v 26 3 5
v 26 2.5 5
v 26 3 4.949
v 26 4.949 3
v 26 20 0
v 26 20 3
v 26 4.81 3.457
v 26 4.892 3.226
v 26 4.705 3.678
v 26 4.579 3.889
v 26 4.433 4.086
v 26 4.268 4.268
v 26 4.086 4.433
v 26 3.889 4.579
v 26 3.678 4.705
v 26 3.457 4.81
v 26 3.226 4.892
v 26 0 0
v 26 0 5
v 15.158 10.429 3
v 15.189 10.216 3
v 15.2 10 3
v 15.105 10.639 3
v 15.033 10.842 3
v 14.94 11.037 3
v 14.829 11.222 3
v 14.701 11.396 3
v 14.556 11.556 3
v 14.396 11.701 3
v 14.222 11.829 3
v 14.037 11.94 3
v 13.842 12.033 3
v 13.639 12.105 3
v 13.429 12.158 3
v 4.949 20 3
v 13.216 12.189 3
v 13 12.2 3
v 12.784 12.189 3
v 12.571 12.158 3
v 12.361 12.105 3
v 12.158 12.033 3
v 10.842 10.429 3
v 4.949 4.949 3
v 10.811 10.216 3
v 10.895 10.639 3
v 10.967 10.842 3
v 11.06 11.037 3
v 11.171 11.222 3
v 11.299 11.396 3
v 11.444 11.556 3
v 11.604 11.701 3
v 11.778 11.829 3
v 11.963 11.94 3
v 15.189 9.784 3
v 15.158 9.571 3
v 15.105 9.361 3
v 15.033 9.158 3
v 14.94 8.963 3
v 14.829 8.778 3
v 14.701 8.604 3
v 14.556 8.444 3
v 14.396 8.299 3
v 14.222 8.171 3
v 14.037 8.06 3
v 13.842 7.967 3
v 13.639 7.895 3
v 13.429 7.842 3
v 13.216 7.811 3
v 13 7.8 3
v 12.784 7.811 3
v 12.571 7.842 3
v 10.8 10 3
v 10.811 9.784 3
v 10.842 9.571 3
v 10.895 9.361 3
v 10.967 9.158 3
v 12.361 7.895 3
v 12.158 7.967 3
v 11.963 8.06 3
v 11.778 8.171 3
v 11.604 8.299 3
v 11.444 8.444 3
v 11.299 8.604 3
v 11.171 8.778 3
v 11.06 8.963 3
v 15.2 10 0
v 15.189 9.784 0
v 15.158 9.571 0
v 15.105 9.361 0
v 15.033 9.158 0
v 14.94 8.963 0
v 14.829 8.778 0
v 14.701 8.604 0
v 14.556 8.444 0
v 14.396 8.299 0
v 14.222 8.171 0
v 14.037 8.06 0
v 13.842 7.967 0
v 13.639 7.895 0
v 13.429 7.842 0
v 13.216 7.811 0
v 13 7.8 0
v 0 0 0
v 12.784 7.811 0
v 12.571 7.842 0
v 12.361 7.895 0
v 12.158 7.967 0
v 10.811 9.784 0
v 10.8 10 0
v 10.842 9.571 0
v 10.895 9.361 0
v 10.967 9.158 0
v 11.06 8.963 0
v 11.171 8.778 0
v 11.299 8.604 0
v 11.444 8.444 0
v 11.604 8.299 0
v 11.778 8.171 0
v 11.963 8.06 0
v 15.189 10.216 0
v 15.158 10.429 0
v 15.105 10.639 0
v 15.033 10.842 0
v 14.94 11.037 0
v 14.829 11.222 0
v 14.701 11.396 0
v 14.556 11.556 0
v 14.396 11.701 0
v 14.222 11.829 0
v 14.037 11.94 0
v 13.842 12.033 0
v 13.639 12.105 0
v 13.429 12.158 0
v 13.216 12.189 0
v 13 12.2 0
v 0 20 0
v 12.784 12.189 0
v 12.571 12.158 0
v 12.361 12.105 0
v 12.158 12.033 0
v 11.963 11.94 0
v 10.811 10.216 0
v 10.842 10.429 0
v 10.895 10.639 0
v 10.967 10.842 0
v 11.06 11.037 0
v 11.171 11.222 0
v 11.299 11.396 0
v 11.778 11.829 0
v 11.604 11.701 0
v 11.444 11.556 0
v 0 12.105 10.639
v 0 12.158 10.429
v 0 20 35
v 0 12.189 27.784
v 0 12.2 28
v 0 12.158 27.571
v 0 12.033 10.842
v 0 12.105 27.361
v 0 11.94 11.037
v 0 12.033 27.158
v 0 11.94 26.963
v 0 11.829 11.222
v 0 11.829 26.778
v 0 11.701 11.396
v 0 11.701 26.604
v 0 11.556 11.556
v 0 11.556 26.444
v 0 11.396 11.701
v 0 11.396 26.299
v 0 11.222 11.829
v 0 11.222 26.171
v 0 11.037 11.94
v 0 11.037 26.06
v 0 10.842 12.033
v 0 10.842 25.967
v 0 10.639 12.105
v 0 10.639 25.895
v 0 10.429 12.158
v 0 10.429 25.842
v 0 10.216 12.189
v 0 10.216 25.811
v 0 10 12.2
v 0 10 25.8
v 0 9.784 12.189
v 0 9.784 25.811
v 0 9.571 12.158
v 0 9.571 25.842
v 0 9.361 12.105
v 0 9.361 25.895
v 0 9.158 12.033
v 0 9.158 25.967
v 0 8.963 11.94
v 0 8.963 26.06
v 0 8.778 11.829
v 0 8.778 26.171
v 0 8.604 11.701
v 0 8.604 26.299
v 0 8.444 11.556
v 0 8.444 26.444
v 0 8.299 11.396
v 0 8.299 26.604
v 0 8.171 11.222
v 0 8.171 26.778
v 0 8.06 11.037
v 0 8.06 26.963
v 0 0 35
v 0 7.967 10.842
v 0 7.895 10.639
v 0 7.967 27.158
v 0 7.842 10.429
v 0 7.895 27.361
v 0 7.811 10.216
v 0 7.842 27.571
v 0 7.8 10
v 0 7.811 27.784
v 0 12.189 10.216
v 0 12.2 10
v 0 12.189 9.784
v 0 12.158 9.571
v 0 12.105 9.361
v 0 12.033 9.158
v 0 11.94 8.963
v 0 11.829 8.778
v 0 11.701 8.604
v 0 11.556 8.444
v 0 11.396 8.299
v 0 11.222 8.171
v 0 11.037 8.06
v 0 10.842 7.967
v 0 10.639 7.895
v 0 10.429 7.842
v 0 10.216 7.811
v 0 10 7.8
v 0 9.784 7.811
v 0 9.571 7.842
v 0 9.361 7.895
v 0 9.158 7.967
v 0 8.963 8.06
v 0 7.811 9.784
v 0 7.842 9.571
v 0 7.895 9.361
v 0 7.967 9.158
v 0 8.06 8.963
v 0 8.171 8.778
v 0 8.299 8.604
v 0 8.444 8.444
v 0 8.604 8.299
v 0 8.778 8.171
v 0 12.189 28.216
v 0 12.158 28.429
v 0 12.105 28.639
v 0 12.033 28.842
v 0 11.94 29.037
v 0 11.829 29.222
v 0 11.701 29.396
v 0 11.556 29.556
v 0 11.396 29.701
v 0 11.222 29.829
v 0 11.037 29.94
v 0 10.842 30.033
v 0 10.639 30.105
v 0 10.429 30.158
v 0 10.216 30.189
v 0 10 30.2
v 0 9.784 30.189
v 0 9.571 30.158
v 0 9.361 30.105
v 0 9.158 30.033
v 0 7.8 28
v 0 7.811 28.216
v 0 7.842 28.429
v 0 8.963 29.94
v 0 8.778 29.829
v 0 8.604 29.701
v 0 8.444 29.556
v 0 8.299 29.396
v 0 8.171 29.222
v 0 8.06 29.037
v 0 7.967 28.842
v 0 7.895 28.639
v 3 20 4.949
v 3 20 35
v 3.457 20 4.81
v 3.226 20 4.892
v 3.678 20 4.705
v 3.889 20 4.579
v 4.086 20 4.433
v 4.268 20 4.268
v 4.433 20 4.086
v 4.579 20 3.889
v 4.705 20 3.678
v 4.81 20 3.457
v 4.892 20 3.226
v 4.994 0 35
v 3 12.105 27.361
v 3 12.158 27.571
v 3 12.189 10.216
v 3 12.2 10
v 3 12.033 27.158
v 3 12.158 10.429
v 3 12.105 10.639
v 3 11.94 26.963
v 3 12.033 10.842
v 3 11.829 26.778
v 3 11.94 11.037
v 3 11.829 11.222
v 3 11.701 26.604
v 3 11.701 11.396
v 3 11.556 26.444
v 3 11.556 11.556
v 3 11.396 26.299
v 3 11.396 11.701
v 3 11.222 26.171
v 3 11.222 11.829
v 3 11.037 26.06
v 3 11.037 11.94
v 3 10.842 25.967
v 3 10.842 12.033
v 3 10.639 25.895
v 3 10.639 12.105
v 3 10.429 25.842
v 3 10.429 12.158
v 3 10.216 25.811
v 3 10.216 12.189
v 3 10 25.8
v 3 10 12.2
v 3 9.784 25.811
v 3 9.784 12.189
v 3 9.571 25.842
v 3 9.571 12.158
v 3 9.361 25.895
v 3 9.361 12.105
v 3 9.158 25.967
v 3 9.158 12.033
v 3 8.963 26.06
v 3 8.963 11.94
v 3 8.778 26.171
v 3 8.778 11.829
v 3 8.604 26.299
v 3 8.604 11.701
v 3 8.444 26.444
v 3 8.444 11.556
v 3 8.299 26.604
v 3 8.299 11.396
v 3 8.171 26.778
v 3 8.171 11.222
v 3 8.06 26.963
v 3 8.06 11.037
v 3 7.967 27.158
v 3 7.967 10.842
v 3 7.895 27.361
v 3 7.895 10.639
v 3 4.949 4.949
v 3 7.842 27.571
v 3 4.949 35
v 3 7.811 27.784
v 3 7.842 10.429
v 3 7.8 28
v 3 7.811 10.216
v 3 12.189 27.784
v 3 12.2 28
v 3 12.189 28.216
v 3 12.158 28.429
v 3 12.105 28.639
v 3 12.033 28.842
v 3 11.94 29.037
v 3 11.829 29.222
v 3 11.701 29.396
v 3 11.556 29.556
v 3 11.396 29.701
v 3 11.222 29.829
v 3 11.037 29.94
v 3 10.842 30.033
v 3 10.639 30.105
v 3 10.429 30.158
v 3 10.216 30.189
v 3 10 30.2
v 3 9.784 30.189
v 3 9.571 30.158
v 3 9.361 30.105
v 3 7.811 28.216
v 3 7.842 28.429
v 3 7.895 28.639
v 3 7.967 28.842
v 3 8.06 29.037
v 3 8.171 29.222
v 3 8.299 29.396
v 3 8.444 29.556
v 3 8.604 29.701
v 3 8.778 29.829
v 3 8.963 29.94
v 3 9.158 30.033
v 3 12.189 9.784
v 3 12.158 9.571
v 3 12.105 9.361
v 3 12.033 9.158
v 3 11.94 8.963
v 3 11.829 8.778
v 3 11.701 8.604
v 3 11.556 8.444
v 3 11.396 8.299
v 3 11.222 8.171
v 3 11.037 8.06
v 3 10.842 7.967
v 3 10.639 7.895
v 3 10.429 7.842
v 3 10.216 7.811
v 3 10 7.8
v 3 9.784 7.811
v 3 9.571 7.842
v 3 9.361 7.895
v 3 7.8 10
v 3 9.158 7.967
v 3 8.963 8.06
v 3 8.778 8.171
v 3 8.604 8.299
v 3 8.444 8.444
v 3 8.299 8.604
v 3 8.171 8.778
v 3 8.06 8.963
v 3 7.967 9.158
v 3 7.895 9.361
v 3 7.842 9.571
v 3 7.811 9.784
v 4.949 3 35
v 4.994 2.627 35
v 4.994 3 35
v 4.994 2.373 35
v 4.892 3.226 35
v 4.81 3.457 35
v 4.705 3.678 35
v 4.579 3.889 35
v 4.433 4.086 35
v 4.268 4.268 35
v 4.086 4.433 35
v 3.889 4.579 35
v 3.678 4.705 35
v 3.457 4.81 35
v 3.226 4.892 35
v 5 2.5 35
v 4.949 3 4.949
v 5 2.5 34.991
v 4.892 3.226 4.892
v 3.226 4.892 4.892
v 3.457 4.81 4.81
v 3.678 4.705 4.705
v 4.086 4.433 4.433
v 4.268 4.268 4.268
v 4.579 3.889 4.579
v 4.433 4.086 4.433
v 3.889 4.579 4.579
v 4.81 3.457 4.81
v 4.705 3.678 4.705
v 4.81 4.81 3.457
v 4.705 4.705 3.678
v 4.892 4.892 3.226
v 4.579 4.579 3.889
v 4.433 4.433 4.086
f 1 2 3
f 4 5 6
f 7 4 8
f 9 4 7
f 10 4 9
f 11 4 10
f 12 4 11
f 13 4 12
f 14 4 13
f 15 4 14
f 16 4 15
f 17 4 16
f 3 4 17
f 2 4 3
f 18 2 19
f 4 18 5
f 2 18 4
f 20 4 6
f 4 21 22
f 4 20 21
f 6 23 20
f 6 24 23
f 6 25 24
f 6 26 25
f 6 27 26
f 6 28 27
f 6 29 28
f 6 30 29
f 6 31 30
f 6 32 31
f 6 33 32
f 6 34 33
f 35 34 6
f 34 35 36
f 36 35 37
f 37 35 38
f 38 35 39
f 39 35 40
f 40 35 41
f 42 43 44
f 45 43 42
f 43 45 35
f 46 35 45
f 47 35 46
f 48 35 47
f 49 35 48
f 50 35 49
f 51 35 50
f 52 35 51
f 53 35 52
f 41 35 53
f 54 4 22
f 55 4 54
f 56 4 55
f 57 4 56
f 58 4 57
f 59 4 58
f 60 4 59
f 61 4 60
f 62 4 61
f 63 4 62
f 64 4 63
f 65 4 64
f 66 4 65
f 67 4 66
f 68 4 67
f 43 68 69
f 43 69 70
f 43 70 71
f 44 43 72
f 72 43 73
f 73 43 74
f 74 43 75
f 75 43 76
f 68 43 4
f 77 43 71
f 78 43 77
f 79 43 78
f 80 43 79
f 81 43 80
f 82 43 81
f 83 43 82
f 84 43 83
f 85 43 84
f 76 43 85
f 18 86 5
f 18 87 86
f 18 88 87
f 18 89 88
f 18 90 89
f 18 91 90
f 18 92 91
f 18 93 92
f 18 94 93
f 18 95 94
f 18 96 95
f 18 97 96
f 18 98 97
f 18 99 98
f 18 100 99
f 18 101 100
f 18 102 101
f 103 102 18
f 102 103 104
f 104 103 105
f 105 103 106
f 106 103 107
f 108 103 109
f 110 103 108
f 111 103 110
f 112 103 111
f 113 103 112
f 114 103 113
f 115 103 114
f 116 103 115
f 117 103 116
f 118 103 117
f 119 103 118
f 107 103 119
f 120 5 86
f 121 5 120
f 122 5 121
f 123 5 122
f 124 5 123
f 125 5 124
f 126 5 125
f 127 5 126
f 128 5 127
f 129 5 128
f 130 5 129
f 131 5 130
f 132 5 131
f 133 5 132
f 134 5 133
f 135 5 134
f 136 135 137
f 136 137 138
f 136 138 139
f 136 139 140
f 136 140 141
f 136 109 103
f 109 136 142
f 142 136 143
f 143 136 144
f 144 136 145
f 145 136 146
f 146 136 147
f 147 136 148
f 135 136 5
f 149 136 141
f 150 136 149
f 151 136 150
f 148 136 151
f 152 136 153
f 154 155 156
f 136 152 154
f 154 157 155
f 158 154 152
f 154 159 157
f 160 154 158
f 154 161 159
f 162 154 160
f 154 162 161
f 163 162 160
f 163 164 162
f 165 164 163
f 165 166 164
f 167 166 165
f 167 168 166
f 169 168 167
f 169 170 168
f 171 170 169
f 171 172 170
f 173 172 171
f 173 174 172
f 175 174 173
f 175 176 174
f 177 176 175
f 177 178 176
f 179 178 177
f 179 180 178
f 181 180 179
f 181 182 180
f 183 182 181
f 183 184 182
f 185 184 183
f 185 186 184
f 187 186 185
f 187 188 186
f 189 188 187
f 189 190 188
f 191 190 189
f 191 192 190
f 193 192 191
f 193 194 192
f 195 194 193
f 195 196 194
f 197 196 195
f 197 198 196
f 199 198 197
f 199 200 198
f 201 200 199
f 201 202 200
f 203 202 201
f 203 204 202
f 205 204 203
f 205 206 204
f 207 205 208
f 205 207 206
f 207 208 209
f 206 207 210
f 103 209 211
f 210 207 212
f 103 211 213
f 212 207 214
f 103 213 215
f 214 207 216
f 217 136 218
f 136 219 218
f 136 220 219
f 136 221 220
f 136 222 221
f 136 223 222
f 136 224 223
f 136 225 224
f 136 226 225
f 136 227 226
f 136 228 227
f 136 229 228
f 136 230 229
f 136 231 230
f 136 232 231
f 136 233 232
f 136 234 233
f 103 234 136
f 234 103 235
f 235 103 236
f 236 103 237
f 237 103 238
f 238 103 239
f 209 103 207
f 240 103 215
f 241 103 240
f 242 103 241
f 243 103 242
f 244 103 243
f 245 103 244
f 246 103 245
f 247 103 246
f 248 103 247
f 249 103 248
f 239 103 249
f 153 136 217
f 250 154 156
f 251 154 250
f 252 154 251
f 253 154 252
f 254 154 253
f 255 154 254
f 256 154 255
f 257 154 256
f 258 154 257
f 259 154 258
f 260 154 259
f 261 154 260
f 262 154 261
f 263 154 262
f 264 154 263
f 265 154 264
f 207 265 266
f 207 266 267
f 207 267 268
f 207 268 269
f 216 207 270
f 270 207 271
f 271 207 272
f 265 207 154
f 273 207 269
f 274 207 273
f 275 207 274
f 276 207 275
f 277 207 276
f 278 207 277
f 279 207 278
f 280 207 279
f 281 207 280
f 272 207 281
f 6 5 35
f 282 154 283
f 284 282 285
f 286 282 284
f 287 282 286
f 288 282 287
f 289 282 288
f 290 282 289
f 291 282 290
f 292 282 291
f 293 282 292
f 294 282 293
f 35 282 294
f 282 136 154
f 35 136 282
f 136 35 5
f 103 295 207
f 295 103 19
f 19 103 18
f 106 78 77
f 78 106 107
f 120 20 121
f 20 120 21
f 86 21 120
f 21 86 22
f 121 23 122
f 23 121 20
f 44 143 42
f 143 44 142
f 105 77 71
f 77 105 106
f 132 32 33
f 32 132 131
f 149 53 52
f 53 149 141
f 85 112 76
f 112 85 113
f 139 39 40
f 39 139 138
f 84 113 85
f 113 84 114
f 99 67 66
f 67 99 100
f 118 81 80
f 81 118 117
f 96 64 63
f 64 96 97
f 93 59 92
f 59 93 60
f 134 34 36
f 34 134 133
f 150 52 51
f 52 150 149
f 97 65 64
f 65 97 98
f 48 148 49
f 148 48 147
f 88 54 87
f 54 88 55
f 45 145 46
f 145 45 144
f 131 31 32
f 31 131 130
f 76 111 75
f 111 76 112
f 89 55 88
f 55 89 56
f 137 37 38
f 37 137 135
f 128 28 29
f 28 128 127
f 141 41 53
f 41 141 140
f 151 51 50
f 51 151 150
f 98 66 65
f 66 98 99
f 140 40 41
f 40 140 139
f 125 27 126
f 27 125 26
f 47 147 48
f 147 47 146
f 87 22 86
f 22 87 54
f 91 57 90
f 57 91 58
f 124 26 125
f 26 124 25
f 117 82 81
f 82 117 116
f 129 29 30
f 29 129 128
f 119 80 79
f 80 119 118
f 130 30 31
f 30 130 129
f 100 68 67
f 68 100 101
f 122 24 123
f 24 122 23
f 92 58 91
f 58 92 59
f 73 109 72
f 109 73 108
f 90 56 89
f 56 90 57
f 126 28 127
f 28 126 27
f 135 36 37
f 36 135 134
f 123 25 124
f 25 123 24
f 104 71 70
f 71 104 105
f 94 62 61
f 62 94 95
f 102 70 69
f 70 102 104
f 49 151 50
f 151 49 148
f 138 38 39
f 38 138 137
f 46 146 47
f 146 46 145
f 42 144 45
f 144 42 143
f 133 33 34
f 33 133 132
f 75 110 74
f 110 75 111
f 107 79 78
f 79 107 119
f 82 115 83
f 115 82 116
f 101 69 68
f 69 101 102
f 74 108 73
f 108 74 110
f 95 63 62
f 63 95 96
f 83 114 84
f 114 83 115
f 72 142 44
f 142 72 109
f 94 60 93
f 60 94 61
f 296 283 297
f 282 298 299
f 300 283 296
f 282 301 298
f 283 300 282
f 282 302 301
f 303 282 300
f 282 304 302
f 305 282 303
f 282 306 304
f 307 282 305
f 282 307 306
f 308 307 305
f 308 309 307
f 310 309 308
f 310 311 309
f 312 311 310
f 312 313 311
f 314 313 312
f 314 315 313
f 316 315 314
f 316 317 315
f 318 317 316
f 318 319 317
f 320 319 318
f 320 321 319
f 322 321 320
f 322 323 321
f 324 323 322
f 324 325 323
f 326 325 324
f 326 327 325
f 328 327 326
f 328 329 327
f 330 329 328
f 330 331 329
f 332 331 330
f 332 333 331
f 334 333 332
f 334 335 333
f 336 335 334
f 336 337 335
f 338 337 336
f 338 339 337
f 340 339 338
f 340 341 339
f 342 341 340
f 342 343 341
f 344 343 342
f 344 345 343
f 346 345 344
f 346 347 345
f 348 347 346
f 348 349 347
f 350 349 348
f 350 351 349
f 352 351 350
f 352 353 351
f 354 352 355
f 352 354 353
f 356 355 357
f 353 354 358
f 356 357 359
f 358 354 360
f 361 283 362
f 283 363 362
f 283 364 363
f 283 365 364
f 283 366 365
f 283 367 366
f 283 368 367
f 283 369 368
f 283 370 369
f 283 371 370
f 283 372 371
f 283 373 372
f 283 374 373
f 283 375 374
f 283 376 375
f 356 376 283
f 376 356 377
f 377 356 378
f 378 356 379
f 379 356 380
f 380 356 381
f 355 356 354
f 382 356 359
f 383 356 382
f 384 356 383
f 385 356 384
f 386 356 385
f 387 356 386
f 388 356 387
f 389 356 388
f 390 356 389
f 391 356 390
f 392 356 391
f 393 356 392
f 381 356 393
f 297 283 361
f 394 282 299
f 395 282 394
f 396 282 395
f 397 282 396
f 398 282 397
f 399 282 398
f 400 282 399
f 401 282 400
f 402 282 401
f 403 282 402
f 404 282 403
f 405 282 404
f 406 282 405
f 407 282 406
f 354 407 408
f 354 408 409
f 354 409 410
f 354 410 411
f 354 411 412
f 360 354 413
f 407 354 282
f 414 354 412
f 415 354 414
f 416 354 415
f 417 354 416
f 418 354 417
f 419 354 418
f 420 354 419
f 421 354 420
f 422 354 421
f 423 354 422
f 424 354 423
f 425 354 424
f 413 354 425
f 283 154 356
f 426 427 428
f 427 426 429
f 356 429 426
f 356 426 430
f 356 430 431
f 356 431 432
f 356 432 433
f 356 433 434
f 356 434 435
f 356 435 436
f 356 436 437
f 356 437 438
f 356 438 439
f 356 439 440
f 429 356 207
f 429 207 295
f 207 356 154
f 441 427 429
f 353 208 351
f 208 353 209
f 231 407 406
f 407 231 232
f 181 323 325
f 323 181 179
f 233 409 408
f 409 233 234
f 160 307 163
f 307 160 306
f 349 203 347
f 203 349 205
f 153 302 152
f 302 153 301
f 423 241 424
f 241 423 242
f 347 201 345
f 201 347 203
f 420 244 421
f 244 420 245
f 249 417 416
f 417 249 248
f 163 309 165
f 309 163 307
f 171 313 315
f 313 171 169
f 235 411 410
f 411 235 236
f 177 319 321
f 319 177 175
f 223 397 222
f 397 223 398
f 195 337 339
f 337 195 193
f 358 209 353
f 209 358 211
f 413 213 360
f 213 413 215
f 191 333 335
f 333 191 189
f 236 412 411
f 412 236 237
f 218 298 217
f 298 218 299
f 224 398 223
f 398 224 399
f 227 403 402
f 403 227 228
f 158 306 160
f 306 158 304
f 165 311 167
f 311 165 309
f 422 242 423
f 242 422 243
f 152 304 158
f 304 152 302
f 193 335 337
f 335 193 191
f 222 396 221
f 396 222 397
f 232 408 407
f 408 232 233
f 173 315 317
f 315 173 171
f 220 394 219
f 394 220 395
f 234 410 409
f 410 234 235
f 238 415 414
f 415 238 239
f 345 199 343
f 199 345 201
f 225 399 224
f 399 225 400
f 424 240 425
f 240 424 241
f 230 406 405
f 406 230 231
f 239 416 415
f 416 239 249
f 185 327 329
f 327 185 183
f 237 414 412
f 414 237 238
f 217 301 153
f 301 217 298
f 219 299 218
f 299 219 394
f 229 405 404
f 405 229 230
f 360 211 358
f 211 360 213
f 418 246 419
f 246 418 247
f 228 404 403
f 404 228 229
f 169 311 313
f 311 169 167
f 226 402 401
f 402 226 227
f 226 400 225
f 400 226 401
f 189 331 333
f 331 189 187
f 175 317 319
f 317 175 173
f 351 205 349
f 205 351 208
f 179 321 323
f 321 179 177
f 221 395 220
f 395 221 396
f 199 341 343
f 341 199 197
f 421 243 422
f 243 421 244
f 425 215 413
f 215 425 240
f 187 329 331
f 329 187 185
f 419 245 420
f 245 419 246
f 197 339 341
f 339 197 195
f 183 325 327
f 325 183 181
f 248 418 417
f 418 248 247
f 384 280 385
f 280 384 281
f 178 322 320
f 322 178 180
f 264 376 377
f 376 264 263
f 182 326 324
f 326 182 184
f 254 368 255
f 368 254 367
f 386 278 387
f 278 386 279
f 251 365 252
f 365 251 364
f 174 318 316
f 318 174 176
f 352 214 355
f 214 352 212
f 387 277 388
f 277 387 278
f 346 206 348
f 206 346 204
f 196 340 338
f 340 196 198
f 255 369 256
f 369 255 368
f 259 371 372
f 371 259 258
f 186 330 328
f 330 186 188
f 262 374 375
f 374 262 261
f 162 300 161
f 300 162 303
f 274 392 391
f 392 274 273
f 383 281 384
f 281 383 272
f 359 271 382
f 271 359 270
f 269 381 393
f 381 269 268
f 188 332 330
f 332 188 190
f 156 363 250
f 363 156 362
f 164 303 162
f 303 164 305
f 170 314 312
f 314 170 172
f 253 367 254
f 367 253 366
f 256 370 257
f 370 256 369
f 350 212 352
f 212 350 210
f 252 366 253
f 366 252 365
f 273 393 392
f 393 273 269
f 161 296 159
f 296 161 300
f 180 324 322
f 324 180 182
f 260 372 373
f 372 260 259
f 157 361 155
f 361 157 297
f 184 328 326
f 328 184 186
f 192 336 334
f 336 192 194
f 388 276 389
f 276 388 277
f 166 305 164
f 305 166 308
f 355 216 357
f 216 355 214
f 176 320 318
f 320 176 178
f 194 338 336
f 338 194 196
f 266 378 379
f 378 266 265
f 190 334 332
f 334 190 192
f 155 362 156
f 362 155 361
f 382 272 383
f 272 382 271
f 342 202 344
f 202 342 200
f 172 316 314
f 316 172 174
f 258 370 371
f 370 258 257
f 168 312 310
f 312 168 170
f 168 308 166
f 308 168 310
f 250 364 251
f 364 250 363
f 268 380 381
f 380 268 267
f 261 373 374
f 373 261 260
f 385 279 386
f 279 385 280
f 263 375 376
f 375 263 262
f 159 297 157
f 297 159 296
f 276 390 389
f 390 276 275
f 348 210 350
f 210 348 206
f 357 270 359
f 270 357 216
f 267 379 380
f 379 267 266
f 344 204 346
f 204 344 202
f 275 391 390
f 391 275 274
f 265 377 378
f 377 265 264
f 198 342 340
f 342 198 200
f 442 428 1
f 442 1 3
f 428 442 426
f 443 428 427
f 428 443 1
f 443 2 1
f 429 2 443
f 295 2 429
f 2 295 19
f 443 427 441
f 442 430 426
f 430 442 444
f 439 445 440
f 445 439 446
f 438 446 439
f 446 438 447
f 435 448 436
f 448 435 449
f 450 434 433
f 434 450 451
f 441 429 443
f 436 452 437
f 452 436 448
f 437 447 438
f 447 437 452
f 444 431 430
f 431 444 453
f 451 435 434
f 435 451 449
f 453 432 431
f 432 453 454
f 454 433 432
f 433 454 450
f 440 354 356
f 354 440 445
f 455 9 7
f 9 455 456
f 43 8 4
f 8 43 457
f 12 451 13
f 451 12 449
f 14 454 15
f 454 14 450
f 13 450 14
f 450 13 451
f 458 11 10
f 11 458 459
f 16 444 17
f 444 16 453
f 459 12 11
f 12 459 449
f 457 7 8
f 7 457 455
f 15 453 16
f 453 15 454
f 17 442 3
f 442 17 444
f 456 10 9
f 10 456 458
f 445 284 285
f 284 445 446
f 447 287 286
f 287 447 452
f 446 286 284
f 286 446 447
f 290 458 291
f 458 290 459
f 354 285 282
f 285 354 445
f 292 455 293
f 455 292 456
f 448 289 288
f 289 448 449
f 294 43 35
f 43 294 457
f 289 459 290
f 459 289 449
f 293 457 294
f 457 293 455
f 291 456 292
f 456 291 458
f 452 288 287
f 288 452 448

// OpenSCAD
$fn=64;



module stiffening(){
translate([2.5,2.5,0])
cylinder(d=5, h=35);
translate([0,2.5,2.5])
rotate([0,90,0])
cylinder(d=5, h=26);
translate([2.5,0,2.5])
rotate([-90,0,0])
cylinder(d=5, h=20);
}

difference(){
cube([26,20,3]);
translate([13,10,-1])
cylinder(d=4.4, h=5);
}


difference(){
cube([3,20,35]);
translate([-1,10,10])
rotate([0,90,0])
cylinder(d=4.4, h=5);
translate([-1,10,28])
rotate([0,90,0])
cylinder(d=4.4, h=5);
}
difference(){
cube([26,3,35]);
translate([26,-1,5])
rotate([0,-35,0])
cube([20,5,50]);
}
stiffening();
